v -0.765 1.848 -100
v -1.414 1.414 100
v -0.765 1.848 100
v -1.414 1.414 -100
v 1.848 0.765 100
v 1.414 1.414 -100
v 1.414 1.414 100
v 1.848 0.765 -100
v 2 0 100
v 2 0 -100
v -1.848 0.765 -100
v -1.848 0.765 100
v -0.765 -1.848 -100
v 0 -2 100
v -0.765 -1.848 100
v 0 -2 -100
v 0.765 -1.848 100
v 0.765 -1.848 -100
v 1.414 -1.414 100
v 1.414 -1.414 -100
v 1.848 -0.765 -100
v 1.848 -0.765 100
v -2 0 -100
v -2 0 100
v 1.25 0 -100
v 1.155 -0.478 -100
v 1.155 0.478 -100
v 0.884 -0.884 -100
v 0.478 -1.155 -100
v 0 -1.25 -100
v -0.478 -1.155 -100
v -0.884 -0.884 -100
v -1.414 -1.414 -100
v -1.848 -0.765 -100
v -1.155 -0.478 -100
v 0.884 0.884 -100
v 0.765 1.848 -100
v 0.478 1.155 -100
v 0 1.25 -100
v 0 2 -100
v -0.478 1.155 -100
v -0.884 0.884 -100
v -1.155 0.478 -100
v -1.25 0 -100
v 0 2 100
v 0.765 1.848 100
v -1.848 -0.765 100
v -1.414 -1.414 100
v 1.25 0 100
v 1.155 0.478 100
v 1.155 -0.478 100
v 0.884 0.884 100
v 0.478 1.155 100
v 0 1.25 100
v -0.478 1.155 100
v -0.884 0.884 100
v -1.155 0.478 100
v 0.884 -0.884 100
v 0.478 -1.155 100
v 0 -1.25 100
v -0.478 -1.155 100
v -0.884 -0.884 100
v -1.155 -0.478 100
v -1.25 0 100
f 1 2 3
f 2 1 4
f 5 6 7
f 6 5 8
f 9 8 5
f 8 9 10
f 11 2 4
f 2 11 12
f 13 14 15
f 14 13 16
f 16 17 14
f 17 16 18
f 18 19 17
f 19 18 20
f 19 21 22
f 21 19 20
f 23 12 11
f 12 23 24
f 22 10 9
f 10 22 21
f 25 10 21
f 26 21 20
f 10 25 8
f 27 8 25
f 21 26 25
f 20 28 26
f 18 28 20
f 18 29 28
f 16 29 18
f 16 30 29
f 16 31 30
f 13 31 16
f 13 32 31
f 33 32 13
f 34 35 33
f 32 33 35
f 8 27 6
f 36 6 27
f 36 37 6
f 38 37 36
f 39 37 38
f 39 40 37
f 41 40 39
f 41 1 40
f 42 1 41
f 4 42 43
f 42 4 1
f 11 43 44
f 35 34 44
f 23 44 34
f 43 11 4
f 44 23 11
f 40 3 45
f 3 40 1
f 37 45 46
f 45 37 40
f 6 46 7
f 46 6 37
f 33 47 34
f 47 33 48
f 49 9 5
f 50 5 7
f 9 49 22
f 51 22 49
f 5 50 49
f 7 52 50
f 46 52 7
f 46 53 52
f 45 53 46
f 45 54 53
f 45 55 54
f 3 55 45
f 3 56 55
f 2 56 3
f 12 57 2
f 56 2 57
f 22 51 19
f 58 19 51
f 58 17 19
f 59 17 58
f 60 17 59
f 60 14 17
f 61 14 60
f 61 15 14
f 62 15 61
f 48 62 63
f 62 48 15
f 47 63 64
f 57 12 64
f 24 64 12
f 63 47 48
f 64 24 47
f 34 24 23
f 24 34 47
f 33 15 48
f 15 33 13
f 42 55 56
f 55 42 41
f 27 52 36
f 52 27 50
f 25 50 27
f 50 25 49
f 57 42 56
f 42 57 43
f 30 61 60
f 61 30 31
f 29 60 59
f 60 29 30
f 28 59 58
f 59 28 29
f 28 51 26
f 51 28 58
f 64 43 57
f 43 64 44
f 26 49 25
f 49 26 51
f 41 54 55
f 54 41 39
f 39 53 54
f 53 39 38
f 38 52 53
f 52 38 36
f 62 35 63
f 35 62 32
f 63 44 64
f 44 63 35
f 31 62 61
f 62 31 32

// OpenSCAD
// COBRA Tendon Guide - 200.0mm

$fn = 16;

difference() {
    cylinder(h=200.0, d=4, center=true);
    cylinder(h=202.0, d=2.5, center=true);
}
